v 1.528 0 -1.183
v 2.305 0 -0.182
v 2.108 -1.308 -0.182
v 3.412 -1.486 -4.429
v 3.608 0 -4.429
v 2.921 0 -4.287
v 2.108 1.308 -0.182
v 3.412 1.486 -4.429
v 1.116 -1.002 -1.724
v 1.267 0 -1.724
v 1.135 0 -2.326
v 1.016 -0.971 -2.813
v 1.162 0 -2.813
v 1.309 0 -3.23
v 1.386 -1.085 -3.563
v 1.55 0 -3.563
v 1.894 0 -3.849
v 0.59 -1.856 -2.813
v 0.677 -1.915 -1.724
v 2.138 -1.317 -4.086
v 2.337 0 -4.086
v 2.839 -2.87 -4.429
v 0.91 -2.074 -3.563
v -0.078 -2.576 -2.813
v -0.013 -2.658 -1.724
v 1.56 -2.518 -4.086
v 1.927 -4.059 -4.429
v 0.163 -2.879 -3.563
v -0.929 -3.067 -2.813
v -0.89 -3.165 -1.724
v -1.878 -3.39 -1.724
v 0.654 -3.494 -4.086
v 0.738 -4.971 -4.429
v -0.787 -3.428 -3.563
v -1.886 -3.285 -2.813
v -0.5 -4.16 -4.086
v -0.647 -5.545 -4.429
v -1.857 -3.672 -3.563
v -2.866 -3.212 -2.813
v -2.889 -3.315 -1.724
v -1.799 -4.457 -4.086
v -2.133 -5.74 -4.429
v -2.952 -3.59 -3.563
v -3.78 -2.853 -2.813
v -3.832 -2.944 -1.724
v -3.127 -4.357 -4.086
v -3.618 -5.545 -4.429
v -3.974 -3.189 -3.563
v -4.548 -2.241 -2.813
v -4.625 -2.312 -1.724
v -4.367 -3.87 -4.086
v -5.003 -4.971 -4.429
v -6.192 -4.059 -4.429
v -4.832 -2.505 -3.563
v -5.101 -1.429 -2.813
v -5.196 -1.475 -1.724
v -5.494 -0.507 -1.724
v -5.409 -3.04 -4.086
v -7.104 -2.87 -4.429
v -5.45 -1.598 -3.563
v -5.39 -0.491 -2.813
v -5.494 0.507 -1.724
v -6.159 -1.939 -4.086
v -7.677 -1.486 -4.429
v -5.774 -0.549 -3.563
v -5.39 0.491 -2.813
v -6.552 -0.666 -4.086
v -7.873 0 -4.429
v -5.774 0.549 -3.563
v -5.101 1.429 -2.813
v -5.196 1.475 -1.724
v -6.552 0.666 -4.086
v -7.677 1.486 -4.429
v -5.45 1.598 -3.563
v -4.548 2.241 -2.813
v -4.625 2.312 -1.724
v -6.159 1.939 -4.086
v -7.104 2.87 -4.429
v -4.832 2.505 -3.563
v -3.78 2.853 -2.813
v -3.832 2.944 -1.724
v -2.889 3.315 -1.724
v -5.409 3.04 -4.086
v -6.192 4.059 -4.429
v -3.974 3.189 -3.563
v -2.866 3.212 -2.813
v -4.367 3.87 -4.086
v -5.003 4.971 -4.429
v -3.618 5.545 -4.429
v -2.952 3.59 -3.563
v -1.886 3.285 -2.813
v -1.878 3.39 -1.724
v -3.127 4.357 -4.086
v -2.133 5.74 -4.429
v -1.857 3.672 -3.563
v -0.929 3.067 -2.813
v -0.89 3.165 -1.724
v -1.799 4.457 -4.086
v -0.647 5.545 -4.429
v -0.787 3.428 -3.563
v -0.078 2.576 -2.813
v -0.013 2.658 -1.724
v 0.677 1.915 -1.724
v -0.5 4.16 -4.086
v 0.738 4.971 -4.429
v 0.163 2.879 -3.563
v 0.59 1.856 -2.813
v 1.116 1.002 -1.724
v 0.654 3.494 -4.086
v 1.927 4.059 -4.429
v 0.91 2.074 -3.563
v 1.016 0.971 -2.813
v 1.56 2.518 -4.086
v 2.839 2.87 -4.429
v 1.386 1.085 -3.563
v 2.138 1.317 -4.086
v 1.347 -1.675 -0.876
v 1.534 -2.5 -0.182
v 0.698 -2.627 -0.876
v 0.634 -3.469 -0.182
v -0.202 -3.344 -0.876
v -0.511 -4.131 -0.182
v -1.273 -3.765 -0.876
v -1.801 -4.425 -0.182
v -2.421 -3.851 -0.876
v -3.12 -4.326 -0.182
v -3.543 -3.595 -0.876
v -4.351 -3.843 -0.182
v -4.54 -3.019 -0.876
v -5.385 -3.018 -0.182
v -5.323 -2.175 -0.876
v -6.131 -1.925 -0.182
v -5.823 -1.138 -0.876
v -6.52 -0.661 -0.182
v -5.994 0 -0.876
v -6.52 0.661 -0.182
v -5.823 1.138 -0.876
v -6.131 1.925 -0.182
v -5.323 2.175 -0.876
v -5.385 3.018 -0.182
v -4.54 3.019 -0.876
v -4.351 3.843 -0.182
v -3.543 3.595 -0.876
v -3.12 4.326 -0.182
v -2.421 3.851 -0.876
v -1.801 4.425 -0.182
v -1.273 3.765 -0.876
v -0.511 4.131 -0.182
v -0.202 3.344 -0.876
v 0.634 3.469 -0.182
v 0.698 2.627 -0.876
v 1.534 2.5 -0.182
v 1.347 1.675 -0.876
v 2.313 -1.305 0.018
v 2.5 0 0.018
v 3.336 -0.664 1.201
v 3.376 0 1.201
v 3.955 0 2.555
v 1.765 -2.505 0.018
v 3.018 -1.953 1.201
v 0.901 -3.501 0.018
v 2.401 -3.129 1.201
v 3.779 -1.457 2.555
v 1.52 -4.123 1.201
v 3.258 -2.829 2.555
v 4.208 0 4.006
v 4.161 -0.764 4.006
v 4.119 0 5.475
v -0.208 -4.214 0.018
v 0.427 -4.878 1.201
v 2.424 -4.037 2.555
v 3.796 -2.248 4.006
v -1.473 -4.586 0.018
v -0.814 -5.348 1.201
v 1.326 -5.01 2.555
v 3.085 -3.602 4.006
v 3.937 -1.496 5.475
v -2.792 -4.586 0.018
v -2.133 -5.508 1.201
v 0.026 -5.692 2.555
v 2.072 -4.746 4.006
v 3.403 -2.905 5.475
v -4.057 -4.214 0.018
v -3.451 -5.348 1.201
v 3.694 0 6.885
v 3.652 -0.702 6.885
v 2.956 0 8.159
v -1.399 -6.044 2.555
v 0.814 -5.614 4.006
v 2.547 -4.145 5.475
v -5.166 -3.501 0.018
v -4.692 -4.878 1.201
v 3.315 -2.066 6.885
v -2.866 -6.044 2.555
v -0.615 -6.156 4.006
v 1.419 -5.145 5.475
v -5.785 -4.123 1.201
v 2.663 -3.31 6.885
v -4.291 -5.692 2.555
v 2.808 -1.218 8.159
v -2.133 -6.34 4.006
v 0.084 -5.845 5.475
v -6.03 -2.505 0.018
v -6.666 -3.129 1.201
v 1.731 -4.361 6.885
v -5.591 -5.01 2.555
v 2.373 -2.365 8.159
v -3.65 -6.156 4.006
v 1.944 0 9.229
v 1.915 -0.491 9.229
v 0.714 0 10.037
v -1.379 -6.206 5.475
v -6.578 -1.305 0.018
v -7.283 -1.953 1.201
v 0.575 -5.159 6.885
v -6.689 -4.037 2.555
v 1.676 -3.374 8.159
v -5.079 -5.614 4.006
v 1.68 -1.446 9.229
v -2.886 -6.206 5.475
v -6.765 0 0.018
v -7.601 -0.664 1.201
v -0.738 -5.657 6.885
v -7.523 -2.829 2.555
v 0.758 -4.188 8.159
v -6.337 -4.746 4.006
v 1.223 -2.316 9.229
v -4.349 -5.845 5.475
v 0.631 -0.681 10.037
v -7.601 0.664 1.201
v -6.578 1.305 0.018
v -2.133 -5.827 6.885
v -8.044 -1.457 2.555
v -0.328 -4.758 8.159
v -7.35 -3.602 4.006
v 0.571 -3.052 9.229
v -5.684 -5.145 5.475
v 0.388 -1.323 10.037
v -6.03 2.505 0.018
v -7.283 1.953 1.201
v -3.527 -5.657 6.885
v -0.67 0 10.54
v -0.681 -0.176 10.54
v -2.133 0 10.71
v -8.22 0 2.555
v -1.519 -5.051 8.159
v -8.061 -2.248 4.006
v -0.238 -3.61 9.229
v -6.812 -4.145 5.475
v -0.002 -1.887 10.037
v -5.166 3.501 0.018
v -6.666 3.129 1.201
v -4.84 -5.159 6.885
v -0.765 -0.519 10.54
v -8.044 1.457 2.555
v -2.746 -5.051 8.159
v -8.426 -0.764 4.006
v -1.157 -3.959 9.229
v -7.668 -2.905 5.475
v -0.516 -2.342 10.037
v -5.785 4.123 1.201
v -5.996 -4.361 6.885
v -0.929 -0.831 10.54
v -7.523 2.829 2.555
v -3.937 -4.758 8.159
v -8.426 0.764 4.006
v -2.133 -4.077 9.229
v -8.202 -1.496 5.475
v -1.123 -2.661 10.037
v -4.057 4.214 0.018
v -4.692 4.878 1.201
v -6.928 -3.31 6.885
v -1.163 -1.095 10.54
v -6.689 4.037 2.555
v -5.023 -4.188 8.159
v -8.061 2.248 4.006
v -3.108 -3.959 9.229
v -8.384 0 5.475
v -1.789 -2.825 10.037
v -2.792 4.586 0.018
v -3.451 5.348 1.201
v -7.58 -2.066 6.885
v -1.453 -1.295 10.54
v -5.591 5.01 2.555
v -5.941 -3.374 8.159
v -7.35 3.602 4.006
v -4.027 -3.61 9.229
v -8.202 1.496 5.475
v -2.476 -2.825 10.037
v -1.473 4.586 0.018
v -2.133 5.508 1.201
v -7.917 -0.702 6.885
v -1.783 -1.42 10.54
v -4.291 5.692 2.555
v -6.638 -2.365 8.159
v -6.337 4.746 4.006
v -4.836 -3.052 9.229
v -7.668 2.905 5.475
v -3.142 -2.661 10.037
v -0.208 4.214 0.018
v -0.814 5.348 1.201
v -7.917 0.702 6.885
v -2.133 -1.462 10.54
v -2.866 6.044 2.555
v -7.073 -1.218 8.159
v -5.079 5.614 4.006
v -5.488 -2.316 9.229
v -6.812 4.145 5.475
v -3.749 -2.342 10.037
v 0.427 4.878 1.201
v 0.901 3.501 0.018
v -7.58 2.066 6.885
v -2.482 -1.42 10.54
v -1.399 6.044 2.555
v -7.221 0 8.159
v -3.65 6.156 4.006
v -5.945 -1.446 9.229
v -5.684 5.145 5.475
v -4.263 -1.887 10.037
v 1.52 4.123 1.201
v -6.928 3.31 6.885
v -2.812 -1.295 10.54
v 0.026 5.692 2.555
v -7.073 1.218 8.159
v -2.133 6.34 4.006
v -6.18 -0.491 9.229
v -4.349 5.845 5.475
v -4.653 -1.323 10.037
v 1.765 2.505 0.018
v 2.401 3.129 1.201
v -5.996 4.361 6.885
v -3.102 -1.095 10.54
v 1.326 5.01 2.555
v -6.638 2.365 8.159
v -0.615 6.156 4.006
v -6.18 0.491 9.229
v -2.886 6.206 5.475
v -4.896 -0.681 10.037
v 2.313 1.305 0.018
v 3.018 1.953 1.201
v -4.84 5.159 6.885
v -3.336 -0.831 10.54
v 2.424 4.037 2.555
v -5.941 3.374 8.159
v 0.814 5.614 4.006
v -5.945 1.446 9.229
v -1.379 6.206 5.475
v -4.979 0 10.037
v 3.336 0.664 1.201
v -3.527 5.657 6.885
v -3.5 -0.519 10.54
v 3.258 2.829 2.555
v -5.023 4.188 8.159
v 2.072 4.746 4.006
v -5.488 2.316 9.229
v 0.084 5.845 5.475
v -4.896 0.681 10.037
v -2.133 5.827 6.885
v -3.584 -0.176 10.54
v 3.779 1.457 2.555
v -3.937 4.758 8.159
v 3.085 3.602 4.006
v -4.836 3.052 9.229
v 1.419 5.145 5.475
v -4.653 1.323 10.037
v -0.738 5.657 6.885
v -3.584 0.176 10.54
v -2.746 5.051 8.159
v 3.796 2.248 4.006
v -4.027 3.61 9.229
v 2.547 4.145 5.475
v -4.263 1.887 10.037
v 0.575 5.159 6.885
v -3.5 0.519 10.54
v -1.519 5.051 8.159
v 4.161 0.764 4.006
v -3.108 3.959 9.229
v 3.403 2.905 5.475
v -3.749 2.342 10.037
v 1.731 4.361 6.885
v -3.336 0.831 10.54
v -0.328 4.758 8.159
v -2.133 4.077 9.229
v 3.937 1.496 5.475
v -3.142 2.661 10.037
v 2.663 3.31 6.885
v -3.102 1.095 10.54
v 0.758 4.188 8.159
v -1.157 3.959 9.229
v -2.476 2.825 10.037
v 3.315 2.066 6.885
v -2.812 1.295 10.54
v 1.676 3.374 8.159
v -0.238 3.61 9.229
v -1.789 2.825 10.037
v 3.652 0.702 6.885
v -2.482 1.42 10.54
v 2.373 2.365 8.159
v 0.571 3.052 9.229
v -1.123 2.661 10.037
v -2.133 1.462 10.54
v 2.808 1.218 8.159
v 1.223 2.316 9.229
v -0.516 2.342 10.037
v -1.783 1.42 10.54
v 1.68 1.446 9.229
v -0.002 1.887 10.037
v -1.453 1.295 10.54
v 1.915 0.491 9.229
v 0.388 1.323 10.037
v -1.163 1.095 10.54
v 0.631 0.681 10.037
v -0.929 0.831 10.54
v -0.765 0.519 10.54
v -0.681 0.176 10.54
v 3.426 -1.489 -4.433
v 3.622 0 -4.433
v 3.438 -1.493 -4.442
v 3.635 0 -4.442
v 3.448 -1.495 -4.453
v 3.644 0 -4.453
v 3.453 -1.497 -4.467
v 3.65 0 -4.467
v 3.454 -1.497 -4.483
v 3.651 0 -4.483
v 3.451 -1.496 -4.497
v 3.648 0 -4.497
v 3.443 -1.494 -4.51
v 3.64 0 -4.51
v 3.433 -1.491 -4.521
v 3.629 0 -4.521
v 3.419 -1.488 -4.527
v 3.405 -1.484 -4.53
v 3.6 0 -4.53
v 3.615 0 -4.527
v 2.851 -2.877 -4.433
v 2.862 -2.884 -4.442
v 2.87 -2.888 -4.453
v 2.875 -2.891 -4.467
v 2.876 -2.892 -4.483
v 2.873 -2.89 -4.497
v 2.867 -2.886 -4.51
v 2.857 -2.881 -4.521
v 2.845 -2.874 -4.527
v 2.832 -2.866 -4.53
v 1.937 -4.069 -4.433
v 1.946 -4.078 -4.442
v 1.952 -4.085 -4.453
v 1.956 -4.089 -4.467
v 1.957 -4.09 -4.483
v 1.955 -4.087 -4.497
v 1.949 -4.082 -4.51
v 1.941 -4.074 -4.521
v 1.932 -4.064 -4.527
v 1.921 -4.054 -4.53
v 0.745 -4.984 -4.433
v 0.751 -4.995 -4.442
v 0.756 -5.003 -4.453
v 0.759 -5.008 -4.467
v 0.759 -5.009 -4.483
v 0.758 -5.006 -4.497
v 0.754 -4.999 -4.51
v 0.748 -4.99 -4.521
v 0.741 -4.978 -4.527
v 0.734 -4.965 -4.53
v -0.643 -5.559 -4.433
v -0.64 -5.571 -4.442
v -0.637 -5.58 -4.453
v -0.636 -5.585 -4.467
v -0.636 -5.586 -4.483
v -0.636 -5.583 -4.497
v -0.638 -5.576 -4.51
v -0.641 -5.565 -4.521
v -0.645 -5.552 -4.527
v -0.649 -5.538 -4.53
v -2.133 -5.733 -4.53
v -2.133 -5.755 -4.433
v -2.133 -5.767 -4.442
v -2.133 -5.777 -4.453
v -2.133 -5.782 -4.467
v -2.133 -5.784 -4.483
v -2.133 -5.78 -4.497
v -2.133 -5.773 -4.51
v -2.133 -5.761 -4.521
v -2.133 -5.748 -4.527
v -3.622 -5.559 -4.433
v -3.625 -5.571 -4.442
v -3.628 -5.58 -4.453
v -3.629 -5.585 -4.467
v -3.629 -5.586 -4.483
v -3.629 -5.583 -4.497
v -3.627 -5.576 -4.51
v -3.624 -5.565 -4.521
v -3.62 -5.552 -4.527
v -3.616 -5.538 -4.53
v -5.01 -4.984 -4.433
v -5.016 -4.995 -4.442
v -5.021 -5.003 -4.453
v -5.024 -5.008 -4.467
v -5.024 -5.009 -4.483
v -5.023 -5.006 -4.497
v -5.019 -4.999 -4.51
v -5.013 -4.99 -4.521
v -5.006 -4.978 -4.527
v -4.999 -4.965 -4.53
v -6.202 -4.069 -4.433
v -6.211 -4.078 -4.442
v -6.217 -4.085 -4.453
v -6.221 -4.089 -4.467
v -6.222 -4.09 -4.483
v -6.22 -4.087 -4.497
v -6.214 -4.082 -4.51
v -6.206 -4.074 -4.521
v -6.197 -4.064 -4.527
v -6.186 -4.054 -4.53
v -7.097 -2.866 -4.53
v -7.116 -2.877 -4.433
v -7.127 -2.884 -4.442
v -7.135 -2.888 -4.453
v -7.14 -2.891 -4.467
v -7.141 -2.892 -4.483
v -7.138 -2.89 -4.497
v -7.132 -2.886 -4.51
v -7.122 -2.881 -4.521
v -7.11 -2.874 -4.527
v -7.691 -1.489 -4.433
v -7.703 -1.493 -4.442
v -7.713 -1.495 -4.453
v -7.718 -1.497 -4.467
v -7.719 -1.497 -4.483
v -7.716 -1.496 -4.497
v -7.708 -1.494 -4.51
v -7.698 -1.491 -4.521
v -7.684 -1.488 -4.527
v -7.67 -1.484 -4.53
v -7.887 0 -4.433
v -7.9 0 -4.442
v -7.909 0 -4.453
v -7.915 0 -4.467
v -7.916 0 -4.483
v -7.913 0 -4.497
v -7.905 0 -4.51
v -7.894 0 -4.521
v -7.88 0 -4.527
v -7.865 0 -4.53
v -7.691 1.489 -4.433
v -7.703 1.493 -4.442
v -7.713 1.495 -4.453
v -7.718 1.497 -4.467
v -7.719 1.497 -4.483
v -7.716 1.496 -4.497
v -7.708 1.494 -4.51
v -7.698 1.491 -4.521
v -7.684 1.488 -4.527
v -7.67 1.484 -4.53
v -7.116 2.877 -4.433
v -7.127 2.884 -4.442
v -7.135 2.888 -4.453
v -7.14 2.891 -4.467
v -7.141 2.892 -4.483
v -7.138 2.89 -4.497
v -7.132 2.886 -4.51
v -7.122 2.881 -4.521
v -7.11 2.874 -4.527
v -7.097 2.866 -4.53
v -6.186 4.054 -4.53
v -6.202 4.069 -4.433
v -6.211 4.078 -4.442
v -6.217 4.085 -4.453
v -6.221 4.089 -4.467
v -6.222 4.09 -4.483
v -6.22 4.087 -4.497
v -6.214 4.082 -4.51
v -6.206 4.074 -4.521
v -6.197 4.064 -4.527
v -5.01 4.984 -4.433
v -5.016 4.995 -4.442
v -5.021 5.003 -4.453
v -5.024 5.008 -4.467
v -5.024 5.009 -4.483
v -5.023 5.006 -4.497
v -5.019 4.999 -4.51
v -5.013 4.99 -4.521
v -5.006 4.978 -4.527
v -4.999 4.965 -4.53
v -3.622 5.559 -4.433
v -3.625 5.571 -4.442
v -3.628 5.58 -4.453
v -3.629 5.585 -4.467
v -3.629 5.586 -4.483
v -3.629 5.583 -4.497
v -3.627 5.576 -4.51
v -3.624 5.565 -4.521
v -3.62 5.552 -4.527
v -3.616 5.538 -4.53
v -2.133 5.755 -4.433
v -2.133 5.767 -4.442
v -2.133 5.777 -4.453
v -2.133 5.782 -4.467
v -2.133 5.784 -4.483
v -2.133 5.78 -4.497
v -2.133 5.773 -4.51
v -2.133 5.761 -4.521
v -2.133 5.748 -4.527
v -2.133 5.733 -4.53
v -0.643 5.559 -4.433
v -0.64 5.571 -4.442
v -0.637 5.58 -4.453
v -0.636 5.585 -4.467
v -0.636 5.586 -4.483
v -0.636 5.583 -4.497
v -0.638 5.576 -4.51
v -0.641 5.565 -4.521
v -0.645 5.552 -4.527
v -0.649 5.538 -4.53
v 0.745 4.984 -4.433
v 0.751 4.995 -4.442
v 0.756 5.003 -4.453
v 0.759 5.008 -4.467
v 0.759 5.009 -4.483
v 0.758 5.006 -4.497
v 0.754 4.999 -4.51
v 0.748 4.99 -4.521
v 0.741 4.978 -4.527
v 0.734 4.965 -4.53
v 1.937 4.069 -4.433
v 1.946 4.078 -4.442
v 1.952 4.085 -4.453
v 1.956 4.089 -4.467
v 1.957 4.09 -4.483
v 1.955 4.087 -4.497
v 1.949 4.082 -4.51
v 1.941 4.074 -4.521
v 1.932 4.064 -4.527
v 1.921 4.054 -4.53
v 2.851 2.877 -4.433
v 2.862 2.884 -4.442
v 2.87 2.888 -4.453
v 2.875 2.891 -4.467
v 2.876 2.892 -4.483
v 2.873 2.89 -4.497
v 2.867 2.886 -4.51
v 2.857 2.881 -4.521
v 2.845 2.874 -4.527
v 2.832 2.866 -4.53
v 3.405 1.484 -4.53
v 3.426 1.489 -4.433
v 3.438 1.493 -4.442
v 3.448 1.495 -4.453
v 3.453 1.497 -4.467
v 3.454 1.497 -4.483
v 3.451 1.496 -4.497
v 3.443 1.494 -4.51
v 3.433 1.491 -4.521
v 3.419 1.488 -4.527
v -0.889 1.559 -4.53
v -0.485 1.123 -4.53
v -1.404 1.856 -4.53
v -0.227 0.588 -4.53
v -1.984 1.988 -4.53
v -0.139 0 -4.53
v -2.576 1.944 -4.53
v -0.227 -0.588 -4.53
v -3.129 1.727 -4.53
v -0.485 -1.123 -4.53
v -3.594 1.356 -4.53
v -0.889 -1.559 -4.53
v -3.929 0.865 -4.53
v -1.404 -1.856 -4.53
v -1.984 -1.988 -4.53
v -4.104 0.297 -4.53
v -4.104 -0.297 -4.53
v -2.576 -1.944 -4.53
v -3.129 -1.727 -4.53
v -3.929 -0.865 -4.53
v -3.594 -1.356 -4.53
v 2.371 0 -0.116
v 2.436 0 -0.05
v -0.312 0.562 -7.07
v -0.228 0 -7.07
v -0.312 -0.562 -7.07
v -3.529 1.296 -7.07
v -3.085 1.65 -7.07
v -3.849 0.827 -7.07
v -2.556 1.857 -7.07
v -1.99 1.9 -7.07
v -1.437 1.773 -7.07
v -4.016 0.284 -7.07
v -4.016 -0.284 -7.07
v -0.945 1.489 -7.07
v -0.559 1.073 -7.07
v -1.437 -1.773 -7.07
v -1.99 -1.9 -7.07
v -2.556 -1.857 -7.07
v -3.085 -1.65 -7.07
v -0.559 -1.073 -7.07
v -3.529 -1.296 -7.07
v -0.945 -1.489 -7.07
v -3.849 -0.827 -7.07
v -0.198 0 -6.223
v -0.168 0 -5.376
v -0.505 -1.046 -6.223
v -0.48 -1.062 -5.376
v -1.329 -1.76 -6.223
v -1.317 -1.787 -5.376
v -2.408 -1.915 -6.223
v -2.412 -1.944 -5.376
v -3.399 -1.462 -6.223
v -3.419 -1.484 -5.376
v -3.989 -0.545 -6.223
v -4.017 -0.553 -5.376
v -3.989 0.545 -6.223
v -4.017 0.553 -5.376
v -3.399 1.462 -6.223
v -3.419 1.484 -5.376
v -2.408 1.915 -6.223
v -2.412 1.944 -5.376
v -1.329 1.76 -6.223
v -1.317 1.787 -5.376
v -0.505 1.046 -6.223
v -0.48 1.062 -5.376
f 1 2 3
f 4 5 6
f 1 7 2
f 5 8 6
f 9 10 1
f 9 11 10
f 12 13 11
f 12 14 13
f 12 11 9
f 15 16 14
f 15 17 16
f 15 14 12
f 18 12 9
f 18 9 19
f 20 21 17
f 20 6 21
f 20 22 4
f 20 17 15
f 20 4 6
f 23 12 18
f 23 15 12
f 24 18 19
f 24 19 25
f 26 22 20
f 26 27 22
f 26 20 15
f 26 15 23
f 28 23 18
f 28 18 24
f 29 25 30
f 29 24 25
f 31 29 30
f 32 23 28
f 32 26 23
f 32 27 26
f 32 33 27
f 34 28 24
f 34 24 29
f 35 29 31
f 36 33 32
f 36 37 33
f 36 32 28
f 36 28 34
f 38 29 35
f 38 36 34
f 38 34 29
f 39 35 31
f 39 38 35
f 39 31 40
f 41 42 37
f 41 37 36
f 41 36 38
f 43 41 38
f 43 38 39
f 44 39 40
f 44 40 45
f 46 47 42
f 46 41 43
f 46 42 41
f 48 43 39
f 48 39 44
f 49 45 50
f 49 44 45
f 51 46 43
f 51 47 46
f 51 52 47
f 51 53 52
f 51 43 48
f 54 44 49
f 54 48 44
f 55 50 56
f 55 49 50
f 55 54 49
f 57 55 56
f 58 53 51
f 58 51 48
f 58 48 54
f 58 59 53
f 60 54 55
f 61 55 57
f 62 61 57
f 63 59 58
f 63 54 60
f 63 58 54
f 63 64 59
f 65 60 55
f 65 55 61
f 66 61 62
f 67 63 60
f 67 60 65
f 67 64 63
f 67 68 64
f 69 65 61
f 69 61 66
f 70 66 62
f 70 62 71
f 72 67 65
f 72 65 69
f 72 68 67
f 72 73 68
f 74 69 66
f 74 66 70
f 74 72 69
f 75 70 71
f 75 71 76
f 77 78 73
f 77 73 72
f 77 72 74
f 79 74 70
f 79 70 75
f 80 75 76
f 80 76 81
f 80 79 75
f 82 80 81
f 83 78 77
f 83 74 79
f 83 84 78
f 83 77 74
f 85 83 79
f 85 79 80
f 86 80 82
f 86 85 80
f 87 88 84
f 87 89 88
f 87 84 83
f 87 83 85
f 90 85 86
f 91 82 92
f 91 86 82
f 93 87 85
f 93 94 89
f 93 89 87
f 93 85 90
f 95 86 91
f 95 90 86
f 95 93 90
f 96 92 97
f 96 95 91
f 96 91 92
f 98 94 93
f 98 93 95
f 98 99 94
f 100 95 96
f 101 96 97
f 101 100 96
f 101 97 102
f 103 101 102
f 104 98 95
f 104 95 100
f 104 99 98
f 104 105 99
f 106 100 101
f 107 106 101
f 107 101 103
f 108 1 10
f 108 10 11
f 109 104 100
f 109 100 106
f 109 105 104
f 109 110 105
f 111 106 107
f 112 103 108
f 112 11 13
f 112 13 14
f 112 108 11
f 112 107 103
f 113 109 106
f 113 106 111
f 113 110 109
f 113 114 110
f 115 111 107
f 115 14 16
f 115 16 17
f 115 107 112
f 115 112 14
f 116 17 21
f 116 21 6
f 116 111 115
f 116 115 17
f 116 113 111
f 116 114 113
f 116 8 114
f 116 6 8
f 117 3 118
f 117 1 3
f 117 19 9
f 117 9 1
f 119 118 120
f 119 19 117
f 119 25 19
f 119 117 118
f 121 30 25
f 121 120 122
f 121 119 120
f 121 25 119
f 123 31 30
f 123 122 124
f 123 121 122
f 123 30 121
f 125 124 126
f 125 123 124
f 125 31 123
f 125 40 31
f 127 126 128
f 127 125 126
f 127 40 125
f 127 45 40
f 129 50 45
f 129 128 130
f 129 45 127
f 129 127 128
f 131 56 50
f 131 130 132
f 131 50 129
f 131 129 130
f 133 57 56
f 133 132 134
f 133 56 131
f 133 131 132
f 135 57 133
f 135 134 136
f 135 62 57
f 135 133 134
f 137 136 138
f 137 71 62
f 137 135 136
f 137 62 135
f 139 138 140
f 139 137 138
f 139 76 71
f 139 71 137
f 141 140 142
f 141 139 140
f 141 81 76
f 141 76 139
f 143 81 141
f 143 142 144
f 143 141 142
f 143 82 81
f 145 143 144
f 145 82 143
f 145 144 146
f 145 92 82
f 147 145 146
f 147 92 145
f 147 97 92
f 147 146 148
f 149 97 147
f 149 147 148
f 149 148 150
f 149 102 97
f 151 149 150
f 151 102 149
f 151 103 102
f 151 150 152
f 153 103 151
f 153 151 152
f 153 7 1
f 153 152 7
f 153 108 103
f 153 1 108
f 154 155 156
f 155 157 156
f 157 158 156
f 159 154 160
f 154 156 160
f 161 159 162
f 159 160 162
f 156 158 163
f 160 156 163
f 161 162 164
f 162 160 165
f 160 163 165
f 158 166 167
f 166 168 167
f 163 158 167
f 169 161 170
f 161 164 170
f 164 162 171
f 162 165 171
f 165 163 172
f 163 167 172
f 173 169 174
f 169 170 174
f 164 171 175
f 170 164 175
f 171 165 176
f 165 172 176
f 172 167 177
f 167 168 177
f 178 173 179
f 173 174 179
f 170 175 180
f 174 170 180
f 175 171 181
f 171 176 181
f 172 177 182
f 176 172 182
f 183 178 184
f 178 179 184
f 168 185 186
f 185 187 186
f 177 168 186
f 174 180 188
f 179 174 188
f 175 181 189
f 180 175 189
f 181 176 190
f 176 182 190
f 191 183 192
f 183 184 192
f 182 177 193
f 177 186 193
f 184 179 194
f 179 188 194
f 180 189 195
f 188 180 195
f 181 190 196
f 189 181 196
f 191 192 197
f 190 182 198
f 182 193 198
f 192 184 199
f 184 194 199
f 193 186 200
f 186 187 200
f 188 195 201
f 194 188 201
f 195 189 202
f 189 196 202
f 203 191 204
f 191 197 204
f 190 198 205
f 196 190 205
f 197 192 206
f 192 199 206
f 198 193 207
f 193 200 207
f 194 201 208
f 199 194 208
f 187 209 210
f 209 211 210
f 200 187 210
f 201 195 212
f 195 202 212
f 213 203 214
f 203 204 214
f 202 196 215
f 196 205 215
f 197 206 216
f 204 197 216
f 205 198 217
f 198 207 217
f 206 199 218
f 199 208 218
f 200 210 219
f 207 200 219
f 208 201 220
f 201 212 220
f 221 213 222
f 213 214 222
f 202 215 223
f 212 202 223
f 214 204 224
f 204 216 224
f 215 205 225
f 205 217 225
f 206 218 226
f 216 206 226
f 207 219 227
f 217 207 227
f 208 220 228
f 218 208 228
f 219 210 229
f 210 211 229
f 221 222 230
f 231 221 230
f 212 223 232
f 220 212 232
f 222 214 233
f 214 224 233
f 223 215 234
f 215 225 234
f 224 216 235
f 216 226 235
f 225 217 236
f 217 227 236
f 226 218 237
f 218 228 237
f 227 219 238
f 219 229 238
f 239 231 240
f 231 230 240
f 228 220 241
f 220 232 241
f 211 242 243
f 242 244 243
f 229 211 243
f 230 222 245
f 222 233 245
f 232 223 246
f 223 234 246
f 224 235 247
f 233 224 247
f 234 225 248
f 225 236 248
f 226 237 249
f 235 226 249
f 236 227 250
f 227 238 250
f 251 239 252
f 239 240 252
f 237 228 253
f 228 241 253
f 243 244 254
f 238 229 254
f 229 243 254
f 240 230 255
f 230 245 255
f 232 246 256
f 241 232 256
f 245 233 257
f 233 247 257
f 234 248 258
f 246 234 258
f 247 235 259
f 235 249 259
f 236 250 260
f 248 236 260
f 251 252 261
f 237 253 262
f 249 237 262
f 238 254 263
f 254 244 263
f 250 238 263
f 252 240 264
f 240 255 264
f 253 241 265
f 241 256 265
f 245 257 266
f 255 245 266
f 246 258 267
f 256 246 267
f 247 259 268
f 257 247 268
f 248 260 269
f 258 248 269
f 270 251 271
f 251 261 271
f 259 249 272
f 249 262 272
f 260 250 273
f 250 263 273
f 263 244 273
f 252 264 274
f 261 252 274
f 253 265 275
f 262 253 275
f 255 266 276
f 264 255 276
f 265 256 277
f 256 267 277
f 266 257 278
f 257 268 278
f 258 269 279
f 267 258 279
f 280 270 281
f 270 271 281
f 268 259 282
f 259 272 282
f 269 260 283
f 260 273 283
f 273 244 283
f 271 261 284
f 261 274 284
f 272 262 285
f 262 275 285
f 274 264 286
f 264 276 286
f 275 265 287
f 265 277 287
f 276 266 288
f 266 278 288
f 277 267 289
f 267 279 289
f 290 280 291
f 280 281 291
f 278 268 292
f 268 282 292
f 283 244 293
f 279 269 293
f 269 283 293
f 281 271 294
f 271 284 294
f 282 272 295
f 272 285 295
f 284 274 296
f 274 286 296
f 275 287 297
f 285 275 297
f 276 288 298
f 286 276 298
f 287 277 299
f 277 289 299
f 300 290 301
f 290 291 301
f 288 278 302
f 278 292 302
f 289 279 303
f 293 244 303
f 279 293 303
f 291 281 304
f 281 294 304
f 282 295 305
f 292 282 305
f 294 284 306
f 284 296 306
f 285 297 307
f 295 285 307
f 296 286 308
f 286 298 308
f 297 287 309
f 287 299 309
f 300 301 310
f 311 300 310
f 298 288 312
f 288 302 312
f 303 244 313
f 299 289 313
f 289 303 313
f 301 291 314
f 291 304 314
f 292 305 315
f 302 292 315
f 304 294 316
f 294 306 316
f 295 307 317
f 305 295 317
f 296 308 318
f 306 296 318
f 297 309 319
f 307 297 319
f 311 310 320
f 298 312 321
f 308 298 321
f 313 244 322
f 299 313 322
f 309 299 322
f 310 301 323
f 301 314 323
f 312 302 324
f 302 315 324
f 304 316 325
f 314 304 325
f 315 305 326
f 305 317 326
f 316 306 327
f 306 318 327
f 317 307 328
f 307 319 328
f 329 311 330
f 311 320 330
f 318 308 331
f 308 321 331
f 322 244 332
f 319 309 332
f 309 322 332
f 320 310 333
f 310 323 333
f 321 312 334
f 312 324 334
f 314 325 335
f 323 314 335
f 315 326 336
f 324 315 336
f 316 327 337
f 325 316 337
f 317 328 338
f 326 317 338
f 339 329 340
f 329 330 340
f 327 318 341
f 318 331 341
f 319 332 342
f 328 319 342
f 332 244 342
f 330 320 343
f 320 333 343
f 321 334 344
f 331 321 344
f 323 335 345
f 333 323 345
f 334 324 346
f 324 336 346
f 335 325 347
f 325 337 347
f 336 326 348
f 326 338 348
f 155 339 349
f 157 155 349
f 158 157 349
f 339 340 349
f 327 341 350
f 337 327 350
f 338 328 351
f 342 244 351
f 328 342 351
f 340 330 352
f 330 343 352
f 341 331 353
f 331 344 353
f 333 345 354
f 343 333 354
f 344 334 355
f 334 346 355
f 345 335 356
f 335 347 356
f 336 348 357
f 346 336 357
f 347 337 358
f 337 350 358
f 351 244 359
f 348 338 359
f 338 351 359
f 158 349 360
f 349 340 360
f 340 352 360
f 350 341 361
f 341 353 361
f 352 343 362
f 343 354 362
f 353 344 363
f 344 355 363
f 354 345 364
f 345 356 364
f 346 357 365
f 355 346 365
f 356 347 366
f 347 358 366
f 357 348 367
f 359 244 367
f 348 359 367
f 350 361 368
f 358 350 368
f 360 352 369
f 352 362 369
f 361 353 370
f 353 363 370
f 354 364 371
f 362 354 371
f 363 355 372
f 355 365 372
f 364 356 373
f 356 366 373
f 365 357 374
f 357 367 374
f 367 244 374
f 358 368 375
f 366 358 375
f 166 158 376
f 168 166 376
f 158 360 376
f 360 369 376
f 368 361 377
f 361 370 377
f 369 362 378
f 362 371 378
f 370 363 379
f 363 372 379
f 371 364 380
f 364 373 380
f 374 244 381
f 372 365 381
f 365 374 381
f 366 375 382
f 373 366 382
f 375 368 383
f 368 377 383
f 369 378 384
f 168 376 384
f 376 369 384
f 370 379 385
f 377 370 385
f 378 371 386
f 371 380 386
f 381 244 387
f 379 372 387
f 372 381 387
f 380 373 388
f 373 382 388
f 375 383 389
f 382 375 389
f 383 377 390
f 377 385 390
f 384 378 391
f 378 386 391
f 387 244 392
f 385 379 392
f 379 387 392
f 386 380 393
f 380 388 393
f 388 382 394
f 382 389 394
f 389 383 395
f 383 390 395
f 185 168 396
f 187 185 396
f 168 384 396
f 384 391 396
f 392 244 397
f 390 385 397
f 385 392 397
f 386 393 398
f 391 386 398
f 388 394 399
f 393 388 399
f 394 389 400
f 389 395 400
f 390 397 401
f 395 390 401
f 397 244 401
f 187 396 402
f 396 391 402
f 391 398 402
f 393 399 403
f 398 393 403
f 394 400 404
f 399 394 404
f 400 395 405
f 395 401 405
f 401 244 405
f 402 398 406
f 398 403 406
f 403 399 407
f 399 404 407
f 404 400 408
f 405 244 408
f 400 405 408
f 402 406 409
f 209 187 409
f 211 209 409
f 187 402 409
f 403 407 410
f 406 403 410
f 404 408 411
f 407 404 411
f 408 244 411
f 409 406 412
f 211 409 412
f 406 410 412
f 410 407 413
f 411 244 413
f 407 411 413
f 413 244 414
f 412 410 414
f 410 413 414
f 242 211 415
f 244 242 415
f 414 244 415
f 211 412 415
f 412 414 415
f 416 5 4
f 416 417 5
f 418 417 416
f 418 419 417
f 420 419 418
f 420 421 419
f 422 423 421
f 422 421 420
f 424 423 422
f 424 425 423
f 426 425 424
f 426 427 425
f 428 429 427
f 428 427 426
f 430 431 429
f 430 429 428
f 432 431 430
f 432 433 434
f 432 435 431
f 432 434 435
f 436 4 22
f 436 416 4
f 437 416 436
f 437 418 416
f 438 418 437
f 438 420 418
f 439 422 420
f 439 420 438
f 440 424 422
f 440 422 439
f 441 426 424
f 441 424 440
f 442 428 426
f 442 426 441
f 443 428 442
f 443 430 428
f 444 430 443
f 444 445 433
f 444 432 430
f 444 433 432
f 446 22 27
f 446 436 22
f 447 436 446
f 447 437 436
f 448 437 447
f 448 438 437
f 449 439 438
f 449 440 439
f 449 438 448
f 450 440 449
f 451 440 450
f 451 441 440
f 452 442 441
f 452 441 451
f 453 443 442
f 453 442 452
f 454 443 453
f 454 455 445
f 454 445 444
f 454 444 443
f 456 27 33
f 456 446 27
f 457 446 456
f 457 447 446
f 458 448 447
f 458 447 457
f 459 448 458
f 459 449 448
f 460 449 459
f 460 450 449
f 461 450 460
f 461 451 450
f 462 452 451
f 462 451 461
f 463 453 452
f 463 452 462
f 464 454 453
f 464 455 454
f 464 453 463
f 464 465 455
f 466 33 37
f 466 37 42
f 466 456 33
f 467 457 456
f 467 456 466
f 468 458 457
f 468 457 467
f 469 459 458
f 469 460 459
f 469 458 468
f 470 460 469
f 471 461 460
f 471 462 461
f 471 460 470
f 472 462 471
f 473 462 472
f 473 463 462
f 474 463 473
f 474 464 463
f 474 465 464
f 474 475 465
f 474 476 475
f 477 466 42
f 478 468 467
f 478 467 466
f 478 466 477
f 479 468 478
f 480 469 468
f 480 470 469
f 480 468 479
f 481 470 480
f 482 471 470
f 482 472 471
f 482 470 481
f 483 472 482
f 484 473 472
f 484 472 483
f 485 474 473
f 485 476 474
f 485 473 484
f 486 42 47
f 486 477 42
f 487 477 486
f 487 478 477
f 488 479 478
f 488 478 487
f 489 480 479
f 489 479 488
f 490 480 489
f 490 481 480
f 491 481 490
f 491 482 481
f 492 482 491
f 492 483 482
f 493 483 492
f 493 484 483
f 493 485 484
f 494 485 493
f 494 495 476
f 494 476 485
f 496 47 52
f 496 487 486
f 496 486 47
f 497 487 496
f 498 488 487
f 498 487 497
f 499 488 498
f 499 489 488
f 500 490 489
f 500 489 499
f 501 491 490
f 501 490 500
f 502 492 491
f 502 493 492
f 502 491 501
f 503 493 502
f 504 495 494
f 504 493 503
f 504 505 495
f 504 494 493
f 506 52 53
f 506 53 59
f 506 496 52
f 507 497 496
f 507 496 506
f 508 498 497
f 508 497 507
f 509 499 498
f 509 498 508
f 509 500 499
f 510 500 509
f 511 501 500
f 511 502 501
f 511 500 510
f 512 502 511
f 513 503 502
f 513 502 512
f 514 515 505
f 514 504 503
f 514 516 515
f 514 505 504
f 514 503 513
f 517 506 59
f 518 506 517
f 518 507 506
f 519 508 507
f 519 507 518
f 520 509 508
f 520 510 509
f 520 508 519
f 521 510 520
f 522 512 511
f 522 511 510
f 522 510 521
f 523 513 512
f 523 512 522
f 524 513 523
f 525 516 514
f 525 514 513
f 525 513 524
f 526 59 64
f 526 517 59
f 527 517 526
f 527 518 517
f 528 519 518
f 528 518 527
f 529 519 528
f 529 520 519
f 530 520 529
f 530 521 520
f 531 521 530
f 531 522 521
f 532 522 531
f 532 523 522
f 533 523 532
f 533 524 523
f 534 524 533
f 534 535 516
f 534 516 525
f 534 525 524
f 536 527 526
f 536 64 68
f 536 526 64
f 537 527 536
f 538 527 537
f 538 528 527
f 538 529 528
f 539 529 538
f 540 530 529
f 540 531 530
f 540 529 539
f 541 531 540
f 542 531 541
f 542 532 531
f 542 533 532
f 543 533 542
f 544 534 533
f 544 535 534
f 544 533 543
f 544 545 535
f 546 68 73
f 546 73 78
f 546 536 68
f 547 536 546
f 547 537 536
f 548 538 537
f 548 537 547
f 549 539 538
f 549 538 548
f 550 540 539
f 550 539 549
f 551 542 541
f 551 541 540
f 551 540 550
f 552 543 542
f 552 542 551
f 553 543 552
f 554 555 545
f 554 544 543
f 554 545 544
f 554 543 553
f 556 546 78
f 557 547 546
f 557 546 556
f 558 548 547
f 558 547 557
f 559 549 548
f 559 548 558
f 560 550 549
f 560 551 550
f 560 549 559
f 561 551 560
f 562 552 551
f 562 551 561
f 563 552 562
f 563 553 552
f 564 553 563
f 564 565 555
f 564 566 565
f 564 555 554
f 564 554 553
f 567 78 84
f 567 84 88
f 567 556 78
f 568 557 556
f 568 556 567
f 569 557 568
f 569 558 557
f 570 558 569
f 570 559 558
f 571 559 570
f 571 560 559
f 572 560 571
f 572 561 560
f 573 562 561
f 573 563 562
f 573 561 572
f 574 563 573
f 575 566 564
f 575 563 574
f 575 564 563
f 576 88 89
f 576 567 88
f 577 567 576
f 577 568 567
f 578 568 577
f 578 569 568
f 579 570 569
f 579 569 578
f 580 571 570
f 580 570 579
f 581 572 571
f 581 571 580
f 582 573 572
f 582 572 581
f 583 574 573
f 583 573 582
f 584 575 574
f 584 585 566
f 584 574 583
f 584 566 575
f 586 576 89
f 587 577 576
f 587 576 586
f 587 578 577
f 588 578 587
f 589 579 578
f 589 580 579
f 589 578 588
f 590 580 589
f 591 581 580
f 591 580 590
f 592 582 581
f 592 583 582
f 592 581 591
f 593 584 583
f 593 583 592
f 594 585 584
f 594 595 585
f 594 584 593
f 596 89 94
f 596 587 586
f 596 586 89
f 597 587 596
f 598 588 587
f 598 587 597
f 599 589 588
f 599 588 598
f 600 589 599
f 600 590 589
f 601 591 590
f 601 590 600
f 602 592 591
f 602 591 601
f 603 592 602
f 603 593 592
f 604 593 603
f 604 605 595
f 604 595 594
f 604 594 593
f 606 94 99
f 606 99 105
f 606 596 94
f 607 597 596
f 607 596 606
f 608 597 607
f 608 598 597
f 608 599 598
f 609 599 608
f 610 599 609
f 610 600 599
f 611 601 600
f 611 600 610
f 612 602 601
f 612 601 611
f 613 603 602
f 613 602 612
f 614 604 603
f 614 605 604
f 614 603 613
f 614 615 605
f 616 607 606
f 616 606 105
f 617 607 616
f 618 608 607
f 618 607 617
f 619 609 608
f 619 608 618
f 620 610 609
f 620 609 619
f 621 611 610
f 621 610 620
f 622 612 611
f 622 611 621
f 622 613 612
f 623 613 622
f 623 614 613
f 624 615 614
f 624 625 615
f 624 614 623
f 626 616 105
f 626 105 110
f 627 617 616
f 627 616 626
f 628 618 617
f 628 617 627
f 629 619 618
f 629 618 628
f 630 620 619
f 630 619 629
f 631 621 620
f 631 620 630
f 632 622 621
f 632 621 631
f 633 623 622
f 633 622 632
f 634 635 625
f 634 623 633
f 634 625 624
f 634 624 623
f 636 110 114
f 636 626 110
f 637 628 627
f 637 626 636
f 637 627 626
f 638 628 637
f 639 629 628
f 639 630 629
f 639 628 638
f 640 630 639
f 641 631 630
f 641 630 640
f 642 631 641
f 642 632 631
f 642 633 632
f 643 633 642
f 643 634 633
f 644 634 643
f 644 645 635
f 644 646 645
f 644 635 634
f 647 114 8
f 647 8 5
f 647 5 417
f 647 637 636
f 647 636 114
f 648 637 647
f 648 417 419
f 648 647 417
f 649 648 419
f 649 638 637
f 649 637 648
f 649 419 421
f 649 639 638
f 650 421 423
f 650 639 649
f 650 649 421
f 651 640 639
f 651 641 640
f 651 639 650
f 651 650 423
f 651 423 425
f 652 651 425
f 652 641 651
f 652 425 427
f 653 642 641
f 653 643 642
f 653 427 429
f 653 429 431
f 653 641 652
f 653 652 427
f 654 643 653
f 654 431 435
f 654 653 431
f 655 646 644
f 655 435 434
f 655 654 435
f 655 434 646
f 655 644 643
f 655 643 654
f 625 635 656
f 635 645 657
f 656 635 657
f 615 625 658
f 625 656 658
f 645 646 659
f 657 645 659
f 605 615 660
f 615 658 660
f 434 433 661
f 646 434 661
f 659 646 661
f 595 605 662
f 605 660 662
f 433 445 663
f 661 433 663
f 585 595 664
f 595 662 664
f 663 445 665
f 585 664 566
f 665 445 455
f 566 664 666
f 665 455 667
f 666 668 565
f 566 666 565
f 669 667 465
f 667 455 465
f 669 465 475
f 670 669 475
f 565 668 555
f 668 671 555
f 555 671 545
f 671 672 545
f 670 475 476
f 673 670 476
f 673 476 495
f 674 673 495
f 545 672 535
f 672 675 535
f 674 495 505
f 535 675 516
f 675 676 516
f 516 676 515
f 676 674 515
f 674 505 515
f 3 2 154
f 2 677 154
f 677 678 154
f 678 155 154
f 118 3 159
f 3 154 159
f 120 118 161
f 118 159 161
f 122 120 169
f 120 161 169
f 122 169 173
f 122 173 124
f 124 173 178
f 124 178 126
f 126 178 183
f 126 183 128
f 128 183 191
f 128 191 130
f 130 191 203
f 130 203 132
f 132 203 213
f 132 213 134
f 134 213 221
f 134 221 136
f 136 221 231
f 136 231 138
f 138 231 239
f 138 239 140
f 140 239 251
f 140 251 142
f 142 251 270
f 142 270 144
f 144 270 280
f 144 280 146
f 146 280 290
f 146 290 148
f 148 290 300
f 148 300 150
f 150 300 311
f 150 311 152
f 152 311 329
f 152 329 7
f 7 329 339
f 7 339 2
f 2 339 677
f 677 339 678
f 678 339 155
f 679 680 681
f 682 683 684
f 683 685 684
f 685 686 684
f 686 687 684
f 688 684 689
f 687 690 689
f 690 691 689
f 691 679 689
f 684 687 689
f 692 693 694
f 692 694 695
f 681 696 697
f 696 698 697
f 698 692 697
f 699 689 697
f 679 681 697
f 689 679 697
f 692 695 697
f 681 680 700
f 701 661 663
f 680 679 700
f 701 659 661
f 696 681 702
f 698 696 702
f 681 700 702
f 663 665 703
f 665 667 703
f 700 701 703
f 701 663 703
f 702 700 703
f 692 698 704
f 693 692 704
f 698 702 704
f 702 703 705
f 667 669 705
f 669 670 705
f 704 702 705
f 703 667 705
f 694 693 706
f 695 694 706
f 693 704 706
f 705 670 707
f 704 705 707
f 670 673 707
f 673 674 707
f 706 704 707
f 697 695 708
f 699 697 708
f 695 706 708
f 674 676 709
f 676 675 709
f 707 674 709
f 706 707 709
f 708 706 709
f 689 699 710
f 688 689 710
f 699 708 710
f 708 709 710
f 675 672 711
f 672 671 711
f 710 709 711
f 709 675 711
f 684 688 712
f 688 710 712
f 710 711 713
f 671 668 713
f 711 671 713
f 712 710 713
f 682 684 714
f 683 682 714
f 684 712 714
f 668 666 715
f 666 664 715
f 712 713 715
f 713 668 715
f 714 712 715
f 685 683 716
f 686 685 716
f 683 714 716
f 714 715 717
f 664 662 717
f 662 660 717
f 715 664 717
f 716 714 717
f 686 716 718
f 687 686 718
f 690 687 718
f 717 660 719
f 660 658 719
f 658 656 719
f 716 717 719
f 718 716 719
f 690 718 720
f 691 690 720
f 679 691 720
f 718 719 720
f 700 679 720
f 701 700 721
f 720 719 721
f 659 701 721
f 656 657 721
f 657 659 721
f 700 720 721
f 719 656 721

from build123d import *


# Not quite as in the source:
# - a fillet or chamfer that OpenCascade refuses, or shapes differently, is made with other operations: its cross-section is extruded or revolved along the edge and cut away or added


with BuildPart() as f1:
    # F0 (on Front) → F1 (revolve)
    with BuildSketch(Plane.XZ):
        with BuildLine():
            add(Edge.make_bspline(
                [(2.5003758306, 0.0177362721), (2.4404300279, -0.0413985663), (2.3744789771, -0.1082652449), (2.3049510778, -0.1817676763)],
                knots=[0, 0, 0, 0, 0.0510069156, 0.0510069156, 0.0510069156, 0.0510069156], degree=3))
            ThreePointArc((2.5003758306, 0.0177362721), (3.6940969816, 6.8849464932), (-2.1325040052, 10.7104225876))
            Line((-2.1325040052, 10.7104225876), (-2.132504005, -1.9895774124))
            ThreePointArc((-2.132504005, -1.9895774124), (0.2632831128, -1.5202835001), (2.3049510778, -0.1817676763))
        make_face()
        with BuildLine():
            ThreePointArc((2.3049510778, -0.1817676763), (2.4037603545, -0.0830901744), (2.5003758306, 0.0177362721))
            add(Edge.make_bspline(
                [(2.5003758306, 0.0177362721), (2.4404300279, -0.0413985663), (2.3744789771, -0.1082652449), (2.3049510778, -0.1817676763)],
                knots=[0, 0, 0, 0, 0.0510069156, 0.0510069156, 0.0510069156, 0.0510069156], degree=3))
        make_face()
        with BuildLine():
            add(Edge.make_bspline(
                [(2.3049510778, -0.1817676763), (1.9642470512, -0.5419479004), (1.0532611933, -1.6513807021), (1.0539929138, -3.8701076312), (3.2527025422, -4.5295774125), (5.0868722728, -4.5295774125)],
                knots=[0.0510069156, 0.0510069156, 0.0510069156, 0.0510069156, 0.300953508, 0.5847659526, 1, 1, 1, 1], degree=3))
            ThreePointArc((2.3049510778, -0.1817676763), (0.2632831128, -1.5202835001), (-2.132504005, -1.9895774124))
            Line((-2.132504005, -1.9895774124), (-2.1325040049, -4.5295774124))
            Line((-2.1325040049, -4.5295774124), (-0.2275040048, -4.5295774124))
            Line((-0.2275040048, -4.5295774124), (-0.1388052504, -4.5295774124))
            Line((-0.1388052504, -4.5295774124), (5.0868722728, -4.5295774125))
        make_face()
        Polygon((-0.2275040048, -4.5295774124), (-2.1325040049, -4.5295774124), (-2.1325040049, -7.0695774124), (-0.2275040049, -7.0695774124), (-0.1388052504, -4.5295774124), align=None)
    revolve(axis=Axis((-2.132504005, 0, 3.0904225876), (0, 0, -1)))

    # F2: fillet of radius 0.0508 on 1 edges, made by hand

    # F2_s1 → F2_t2 (revolve, cut)
    with BuildSketch(Plane.XZ):
        with BuildLine():
            ThreePointArc((3.6079651255, -4.4285482526), (3.651028038, -4.4825852127), (3.6003709491, -4.5295774123))
            Line((3.6003709491, -4.5295774123), (3.6003709491, -4.5305934123))
            Line((3.6003709491, -4.5305934123), (5.0868722728, -4.5305934125))
            Line((5.0868722728, -4.5305934125), (5.0868722728, -4.5285614125))
            ThreePointArc((5.0868722728, -4.5285614125), (4.3457025483, -4.5054914795), (3.6081170091, -4.4275436694))
            Line((3.6081170091, -4.4275436694), (3.6079651255, -4.4285482526))
        make_face()
    revolve(axis=Axis((-2.1325040049, 0, -4.5295774126), (0, 0, -1)), mode=Mode.SUBTRACT)


solid = f1.part
